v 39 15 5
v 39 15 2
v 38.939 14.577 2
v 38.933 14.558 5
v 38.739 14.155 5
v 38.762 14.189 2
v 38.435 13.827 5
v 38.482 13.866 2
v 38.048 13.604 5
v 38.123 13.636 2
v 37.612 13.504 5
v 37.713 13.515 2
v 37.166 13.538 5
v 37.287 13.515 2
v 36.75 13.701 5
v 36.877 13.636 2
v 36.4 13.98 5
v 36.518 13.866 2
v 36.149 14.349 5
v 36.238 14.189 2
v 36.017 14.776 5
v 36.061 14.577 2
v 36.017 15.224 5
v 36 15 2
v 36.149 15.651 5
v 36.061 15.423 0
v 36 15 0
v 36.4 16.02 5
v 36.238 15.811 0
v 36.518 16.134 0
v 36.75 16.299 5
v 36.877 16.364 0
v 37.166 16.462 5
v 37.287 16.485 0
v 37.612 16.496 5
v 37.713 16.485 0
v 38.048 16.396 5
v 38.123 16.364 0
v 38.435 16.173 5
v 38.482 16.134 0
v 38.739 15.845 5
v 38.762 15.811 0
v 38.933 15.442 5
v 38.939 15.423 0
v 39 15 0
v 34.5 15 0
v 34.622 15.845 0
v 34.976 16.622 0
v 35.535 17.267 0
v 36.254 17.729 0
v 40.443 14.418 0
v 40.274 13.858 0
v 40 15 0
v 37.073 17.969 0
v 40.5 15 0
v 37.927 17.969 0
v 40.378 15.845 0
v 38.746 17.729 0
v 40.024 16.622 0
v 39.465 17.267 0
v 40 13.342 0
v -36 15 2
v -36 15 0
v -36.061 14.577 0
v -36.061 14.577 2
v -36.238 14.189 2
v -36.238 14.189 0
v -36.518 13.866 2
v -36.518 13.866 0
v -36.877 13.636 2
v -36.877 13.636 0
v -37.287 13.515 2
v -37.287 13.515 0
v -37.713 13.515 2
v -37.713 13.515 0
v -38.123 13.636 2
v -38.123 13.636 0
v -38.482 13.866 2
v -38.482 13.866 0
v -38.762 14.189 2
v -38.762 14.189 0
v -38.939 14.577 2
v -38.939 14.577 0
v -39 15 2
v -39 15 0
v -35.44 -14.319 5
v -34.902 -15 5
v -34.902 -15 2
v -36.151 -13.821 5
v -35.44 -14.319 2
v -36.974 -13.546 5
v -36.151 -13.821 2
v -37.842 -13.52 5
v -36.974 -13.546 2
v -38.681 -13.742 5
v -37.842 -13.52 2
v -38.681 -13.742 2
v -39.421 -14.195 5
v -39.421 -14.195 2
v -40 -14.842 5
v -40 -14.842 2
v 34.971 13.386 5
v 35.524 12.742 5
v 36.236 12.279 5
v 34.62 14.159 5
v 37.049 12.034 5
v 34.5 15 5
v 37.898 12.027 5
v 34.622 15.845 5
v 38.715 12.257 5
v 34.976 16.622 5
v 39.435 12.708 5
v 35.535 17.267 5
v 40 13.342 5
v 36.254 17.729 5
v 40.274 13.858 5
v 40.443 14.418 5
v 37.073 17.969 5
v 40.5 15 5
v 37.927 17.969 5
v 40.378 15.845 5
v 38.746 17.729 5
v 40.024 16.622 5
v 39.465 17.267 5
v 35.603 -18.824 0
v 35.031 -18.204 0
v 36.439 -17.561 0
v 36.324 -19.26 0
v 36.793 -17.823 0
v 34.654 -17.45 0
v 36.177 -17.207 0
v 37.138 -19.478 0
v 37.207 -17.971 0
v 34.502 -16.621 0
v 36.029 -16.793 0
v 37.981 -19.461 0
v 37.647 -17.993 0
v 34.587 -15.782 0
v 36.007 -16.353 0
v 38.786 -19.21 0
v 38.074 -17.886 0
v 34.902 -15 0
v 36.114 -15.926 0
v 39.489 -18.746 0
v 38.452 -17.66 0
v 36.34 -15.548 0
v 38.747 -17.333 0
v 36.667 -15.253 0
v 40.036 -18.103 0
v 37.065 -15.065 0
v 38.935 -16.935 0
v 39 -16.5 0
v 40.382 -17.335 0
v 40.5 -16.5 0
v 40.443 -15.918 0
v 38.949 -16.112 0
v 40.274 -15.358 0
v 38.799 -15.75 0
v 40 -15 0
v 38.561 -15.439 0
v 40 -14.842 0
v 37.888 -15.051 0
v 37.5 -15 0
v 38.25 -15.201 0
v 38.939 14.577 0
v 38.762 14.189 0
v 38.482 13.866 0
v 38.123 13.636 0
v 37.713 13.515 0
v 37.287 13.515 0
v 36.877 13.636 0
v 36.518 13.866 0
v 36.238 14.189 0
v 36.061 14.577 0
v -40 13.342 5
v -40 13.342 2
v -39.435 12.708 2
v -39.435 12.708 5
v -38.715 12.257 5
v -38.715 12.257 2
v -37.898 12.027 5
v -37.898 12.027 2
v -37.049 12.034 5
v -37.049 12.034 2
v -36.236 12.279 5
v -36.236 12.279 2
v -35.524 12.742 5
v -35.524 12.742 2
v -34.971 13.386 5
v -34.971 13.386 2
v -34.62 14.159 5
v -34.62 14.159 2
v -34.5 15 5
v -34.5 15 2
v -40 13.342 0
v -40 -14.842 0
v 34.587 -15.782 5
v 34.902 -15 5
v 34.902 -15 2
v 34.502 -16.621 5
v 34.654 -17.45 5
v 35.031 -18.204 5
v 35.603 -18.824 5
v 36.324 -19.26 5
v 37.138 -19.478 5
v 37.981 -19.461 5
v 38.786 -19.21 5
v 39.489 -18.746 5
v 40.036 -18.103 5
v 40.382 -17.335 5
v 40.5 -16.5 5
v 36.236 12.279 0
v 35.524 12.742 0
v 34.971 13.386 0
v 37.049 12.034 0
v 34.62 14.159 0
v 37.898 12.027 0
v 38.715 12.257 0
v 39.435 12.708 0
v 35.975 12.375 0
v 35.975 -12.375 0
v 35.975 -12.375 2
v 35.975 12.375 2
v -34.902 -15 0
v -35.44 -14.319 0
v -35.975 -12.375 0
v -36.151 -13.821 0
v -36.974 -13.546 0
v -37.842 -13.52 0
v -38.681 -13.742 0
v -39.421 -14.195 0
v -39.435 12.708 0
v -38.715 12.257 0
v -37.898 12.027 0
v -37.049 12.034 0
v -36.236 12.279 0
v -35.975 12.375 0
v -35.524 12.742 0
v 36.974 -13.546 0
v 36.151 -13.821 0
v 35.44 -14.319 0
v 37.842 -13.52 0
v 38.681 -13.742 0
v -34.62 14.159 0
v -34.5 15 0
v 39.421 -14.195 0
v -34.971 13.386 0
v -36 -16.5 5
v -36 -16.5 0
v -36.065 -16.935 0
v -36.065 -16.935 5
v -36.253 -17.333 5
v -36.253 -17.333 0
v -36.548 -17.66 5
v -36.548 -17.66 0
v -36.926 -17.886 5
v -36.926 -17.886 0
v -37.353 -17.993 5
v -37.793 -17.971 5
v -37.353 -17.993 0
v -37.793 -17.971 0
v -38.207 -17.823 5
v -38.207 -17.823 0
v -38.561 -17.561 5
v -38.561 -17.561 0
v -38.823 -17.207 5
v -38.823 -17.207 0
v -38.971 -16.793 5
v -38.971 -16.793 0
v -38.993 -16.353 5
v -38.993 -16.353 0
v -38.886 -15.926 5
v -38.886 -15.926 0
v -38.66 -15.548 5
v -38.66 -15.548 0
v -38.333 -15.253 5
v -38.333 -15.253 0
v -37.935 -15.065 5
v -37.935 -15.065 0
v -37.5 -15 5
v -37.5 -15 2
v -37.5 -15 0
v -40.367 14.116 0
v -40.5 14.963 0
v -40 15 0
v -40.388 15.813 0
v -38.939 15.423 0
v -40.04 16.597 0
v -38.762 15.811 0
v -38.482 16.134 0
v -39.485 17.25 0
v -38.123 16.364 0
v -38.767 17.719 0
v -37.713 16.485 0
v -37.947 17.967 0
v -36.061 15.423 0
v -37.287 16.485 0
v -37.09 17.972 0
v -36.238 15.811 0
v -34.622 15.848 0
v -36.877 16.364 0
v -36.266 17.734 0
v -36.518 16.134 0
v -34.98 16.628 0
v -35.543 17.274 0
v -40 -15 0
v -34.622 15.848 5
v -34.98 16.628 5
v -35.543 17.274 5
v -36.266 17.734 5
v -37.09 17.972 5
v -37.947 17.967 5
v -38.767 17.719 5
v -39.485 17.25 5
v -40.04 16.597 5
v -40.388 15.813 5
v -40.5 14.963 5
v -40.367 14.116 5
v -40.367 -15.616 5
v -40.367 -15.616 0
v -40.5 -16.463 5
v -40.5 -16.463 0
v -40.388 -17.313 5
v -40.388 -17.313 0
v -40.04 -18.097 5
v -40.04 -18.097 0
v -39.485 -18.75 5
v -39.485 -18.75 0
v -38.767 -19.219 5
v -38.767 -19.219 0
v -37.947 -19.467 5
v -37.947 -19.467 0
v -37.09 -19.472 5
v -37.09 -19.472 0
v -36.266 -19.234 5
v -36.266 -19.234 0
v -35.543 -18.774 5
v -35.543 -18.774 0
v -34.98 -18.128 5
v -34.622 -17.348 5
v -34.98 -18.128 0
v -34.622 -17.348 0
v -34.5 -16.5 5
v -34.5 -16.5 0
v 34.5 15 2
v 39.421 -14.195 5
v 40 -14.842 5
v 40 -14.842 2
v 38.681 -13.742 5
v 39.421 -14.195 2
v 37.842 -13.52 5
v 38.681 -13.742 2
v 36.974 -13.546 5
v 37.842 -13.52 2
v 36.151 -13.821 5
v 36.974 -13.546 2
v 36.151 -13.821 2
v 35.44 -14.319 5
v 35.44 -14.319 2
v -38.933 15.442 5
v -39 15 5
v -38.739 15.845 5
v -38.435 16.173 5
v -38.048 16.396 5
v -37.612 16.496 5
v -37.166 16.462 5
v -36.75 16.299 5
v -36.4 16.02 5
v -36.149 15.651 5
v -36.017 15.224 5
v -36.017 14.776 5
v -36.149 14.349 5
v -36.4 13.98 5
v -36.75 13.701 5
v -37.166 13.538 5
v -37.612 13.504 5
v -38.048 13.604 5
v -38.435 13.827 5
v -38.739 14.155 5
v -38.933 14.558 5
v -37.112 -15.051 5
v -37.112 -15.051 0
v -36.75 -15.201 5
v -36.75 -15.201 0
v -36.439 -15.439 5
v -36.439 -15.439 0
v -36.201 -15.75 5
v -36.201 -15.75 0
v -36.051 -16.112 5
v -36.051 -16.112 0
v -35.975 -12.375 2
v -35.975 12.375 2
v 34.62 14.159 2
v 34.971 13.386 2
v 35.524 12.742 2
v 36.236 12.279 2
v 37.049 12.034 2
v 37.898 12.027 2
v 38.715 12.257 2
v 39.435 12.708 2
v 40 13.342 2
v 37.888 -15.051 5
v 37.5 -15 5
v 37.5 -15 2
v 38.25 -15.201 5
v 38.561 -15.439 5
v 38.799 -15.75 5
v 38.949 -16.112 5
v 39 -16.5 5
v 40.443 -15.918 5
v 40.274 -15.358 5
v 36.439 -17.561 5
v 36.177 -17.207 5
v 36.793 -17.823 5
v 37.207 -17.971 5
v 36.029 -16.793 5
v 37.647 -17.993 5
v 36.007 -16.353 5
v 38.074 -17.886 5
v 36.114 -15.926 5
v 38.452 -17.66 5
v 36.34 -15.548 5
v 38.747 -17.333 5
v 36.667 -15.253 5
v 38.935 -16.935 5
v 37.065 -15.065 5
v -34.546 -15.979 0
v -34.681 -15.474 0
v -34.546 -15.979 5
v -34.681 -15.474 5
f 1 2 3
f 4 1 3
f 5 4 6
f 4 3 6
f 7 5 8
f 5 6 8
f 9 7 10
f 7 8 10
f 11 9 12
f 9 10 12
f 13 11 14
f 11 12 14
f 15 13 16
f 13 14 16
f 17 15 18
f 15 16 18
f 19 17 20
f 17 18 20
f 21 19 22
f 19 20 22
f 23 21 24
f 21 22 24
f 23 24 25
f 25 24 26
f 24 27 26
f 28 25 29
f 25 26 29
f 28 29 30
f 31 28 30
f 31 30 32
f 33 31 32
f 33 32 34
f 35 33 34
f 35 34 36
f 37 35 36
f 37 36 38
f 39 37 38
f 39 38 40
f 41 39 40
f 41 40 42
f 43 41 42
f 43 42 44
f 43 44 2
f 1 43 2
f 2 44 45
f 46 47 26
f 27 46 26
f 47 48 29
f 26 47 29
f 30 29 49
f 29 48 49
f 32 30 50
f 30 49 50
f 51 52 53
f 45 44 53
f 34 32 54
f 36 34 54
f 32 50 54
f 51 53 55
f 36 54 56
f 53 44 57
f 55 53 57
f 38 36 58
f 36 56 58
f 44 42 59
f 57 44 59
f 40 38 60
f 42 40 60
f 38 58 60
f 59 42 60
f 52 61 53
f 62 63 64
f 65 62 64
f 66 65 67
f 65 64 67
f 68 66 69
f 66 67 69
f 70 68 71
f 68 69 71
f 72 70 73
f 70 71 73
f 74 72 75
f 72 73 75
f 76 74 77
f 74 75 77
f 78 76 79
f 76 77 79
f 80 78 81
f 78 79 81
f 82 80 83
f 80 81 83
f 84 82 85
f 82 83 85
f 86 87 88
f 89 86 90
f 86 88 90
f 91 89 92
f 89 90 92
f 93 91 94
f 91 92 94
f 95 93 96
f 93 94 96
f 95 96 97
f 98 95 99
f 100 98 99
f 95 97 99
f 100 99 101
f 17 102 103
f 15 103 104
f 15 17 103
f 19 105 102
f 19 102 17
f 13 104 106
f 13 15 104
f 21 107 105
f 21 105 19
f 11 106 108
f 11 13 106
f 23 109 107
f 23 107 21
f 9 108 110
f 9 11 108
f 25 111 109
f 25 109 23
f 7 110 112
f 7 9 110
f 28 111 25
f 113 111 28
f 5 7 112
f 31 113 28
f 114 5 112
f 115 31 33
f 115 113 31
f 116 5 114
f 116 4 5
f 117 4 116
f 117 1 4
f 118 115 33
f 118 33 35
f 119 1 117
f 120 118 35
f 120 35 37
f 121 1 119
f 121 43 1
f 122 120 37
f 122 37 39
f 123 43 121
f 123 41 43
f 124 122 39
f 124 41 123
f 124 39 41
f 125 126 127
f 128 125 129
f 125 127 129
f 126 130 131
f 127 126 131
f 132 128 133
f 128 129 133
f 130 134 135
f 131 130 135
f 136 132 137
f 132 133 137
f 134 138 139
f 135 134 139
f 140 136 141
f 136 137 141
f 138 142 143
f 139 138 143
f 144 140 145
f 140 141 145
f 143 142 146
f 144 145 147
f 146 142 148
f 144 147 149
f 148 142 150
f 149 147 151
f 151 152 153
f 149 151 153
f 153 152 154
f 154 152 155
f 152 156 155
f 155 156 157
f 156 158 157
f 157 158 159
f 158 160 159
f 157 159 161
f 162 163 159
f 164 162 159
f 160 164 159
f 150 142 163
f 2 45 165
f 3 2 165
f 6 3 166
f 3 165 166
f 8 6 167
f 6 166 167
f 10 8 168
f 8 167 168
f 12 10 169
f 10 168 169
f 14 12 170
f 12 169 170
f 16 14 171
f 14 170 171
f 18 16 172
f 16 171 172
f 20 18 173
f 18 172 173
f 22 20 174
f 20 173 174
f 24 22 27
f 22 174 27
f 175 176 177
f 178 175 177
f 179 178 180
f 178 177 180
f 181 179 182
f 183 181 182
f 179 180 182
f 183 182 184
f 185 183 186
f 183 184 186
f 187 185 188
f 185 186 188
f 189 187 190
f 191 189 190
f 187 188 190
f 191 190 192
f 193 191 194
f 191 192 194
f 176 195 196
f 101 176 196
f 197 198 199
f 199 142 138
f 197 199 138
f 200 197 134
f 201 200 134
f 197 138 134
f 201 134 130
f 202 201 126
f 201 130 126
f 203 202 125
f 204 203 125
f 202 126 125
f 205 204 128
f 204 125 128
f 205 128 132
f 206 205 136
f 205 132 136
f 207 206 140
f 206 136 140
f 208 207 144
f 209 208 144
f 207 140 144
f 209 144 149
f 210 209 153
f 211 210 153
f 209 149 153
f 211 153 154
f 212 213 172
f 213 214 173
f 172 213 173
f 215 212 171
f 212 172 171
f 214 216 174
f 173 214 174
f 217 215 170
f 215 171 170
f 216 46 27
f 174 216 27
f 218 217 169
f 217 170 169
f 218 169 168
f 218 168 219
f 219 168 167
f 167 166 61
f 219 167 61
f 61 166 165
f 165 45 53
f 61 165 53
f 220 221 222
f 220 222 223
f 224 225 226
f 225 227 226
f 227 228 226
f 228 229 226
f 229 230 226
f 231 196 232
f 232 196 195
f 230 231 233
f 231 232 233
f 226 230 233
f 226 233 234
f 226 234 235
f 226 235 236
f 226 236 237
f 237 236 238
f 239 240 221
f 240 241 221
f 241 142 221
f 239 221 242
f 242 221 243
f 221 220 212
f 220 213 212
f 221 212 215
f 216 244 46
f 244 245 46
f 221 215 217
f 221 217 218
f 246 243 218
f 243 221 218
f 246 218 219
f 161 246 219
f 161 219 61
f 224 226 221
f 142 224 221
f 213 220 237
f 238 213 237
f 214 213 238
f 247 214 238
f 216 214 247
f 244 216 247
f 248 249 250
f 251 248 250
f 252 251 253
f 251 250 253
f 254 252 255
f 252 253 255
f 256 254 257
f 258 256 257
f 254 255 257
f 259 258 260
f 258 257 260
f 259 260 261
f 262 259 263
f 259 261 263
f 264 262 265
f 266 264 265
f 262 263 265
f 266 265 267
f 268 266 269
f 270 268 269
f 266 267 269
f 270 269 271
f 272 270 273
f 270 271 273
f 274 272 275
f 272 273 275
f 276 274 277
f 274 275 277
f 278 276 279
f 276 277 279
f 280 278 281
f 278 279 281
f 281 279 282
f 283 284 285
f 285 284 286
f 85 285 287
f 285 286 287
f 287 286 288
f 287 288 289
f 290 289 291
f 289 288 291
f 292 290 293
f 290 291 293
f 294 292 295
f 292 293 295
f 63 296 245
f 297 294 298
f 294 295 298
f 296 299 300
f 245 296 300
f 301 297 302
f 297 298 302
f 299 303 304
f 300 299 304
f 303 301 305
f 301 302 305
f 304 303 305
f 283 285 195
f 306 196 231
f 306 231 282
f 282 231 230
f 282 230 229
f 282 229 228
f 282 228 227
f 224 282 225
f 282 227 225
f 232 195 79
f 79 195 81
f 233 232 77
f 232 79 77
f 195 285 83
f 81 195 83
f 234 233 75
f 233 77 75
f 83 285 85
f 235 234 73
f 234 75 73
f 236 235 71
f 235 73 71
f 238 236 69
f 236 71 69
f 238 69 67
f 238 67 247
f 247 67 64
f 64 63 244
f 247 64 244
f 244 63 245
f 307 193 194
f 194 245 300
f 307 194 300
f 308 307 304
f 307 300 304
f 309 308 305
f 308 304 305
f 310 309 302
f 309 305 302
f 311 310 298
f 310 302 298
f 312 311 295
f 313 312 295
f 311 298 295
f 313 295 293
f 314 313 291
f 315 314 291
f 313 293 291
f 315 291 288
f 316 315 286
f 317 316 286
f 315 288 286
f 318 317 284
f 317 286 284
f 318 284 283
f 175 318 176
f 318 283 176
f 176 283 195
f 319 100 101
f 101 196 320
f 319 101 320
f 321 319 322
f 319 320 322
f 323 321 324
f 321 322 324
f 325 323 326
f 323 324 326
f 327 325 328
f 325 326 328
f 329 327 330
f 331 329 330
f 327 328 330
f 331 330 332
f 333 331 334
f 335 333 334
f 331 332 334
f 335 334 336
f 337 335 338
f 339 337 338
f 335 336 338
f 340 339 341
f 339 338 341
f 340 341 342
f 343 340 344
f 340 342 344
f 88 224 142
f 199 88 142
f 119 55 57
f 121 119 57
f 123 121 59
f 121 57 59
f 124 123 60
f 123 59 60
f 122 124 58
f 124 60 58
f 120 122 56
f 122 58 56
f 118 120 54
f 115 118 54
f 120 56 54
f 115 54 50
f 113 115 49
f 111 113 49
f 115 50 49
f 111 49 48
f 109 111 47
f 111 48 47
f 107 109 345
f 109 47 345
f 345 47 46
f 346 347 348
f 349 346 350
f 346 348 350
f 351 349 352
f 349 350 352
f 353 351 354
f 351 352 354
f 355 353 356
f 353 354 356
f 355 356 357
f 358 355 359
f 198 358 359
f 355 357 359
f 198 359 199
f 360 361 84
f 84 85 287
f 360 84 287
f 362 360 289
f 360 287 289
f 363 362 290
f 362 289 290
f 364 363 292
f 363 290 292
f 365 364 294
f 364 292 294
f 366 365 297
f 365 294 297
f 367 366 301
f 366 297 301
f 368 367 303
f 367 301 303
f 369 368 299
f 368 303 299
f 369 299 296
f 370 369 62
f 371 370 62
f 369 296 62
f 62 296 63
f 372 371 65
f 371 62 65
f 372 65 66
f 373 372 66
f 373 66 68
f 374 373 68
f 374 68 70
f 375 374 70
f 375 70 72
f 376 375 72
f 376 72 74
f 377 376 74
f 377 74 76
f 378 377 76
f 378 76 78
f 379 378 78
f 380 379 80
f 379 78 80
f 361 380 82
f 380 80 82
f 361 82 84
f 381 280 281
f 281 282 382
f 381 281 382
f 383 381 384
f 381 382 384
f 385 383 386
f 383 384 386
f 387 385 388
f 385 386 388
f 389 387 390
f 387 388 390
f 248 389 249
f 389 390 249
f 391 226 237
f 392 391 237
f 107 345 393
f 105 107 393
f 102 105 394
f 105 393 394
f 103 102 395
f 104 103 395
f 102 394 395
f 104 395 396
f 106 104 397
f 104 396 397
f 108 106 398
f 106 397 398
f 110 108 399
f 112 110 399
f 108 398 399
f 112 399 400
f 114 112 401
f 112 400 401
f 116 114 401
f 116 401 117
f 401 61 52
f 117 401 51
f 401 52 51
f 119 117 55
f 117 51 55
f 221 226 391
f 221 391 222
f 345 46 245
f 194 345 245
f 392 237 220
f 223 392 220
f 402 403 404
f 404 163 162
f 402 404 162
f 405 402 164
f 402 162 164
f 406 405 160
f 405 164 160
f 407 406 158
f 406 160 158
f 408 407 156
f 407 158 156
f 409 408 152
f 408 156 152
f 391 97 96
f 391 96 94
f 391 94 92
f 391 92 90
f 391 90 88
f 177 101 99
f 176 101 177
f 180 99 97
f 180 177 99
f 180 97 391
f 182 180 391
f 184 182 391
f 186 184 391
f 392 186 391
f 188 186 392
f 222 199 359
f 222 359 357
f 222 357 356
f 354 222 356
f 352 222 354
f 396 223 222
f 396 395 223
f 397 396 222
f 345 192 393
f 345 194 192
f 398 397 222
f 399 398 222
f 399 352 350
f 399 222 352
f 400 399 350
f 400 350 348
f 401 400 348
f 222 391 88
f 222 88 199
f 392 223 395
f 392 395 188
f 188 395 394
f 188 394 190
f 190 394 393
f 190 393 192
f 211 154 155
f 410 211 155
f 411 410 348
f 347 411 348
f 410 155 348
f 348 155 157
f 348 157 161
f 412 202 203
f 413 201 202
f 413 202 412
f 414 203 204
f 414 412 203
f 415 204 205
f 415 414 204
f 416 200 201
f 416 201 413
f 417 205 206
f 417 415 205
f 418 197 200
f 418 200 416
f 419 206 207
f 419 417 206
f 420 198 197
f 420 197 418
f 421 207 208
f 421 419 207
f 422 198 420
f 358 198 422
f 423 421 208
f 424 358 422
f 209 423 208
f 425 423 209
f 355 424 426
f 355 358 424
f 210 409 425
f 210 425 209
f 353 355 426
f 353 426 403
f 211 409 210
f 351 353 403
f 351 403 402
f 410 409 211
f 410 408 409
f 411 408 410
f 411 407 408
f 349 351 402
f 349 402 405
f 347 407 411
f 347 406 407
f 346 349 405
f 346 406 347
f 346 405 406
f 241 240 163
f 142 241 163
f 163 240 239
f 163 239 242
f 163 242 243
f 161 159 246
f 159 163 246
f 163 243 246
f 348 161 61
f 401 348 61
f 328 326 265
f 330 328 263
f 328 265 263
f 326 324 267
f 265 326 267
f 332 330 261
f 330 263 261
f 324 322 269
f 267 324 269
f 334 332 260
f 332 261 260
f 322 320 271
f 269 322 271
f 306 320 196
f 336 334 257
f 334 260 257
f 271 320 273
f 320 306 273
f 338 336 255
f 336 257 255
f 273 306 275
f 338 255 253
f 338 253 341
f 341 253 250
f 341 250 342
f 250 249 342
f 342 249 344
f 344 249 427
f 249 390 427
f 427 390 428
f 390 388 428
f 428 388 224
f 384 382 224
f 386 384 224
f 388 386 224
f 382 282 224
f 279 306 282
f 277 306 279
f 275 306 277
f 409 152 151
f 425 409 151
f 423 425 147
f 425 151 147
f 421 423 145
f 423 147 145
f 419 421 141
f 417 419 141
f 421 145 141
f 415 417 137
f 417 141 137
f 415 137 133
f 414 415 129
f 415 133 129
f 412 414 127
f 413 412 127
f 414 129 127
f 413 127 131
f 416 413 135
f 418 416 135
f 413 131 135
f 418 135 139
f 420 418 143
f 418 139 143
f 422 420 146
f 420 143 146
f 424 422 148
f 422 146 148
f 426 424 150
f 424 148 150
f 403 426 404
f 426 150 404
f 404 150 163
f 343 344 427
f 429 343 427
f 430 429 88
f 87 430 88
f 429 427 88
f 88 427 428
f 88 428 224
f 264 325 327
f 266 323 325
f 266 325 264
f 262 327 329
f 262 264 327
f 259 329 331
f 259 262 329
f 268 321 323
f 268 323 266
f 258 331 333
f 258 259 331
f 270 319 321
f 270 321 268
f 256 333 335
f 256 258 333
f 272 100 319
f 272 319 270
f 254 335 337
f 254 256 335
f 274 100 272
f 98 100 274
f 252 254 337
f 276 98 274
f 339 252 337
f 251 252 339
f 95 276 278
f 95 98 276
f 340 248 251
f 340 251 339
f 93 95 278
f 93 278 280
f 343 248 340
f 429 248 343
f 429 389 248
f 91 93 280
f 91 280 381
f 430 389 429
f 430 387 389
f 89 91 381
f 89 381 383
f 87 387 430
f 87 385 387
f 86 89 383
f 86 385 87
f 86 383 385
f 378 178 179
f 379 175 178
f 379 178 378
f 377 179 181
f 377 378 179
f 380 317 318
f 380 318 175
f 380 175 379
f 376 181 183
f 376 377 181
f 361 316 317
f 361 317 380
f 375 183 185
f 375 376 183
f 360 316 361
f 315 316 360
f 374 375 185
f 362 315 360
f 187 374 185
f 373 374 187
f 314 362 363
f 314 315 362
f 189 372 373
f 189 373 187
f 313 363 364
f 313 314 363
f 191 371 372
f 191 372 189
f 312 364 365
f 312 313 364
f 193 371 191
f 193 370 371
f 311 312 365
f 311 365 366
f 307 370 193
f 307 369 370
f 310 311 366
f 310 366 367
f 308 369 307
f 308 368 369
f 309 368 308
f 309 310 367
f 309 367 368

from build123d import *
from build123d import SkipClean  # not in build123d's __all__

# Parameters (mm, degrees)
F0_W     = 71.95
F0_H     = 24.75
F1_DEPTH = 2
F2_DEPTH = 5


with BuildPart() as f1:
    # F0 (on Top) → F1 (new body)
    with BuildSketch(Plane.XY):
        with BuildLine():
            Line((34.5, 15), (-34.5, 15))
            ThreePointArc((-34.5, 15), (-36.6339745962, 12.1277186767), (-40, 13.3416876048))
            Line((-40, 13.3416876048), (-40, -14.8416876048))
            ThreePointArc((-40, -14.8416876048), (-37.4068848056, -13.5014454214), (-34.9019237886, -15))
            Line((-34.9019237886, -15), (34.9019237886, -15))
            ThreePointArc((34.9019237886, -15), (37.4068848056, -13.5014454214), (40, -14.8416876048))
            Line((40, -14.8416876048), (40, 13.3416876048))
            ThreePointArc((40, 13.3416876048), (36.6339745962, 12.1277186767), (34.5, 15))
        make_face()
        Rectangle(F0_W, F0_H, mode=Mode.SUBTRACT)
        with BuildLine():
            Line((-34.5, 15), (-36, 15))
            ThreePointArc((-36, 15), (-37.5, 13.5), (-39, 15))
            Line((-39, 15), (-40, 15))
            Line((-40, 15), (-40, 13.3416876048))
            ThreePointArc((-40, 13.3416876048), (-36.6339745962, 12.1277186767), (-34.5, 15))
        make_face()
        with BuildLine():
            Line((36, 15), (34.5, 15))
            ThreePointArc((34.5, 15), (36.6339745962, 12.1277186767), (40, 13.3416876048))
            Line((40, 13.3416876048), (40, 15))
            Line((40, 15), (39, 15))
            ThreePointArc((39, 15), (37.5, 13.5), (36, 15))
        make_face()
        with BuildLine():
            Line((40, -15), (40, -14.8416876048))
            ThreePointArc((40, -14.8416876048), (37.4068848056, -13.5014454214), (34.9019237886, -15))
            Line((34.9019237886, -15), (37.5, -15))
            Line((37.5, -15), (40, -15))
        make_face()
        with BuildLine():
            ThreePointArc((-34.9019237886, -15), (-37.4068848056, -13.5014454214), (-40, -14.8416876048))
            Line((-40, -14.8416876048), (-40, -15))
            Line((-40, -15), (-37.5, -15))
            Line((-37.5, -15), (-34.9019237886, -15))
        make_face()
    extrude(amount=F1_DEPTH)

    # F0 (on Top) → F2 (join)
    with BuildSketch(Plane.XY):
        with BuildLine():
            Line((-34.5, 15), (-36, 15))
            ThreePointArc((-36, 15), (-37.5, 13.5), (-39, 15))
            Line((-39, 15), (-40, 15))
            Line((-40, 15), (-40, 13.3416876048))
            ThreePointArc((-40, 13.3416876048), (-36.6339745962, 12.1277186767), (-34.5, 15))
        make_face()
        with BuildLine():
            ThreePointArc((-39, 15), (-37.5, 16.5), (-36, 15))
            Line((-36, 15), (-34.5, 15))
            ThreePointArc((-34.5, 15), (-38.3660254038, 17.8722813233), (-40, 13.3416876048))
            Line((-40, 13.3416876048), (-40, 15))
            Line((-40, 15), (-39, 15))
        make_face()
        with BuildLine():
            Line((-40, -15), (-40, -14.8416876048))
            ThreePointArc((-40, -14.8416876048), (-38.3660254038, -19.3722813233), (-34.5, -16.5))
            ThreePointArc((-34.5, -16.5), (-34.6022225211, -15.7235428647), (-34.9019237886, -15))
            Line((-34.9019237886, -15), (-37.5, -15))
            Line((-37.5, -15), (-40, -15))
        make_face()
        with BuildLine():
            ThreePointArc((-36, -16.5), (-38.5606601718, -17.5606601718), (-37.5, -15))
            ThreePointArc((-37.5, -15), (-36.4393398282, -15.4393398282), (-36, -16.5))
        make_face(mode=Mode.SUBTRACT)
        with BuildLine():
            ThreePointArc((-34.9019237886, -15), (-37.4068848056, -13.5014454214), (-40, -14.8416876048))
            Line((-40, -14.8416876048), (-40, -15))
            Line((-40, -15), (-37.5, -15))
            Line((-37.5, -15), (-34.9019237886, -15))
        make_face()
        with BuildLine():
            ThreePointArc((40.5, -16.5), (40.3722813233, -15.6339745962), (40, -14.8416876048))
            Line((40, -14.8416876048), (40, -15))
            Line((40, -15), (37.5, -15))
            Line((37.5, -15), (34.9019237886, -15))
            ThreePointArc((34.9019237886, -15), (36.7235428647, -19.3977774789), (40.5, -16.5))
        make_face()
        with BuildLine():
            ThreePointArc((39, -16.5), (36.4393398282, -17.5606601718), (37.5, -15))
            ThreePointArc((37.5, -15), (38.5606601718, -15.4393398282), (39, -16.5))
        make_face(mode=Mode.SUBTRACT)
        with BuildLine():
            Line((40, -15), (40, -14.8416876048))
            ThreePointArc((40, -14.8416876048), (37.4068848056, -13.5014454214), (34.9019237886, -15))
            Line((34.9019237886, -15), (37.5, -15))
            Line((37.5, -15), (40, -15))
        make_face()
        with BuildLine():
            ThreePointArc((40.5, 15), (37.5, 18), (34.5, 15))
            Line((34.5, 15), (36, 15))
            ThreePointArc((36, 15), (37.5, 16.5), (39, 15))
            Line((39, 15), (40, 15))
            Line((40, 15), (40, 13.3416876048))
            ThreePointArc((40, 13.3416876048), (40.3722813233, 14.1339745962), (40.5, 15))
        make_face()
        with BuildLine():
            Line((36, 15), (34.5, 15))
            ThreePointArc((34.5, 15), (36.6339745962, 12.1277186767), (40, 13.3416876048))
            Line((40, 13.3416876048), (40, 15))
            Line((40, 15), (39, 15))
            ThreePointArc((39, 15), (37.5, 13.5), (36, 15))
        make_face()
    with SkipClean():  # cleaning this boolean's faces spoils the solid; the shape is the same uncleaned
        extrude(amount=F2_DEPTH)


solid = f1.part
